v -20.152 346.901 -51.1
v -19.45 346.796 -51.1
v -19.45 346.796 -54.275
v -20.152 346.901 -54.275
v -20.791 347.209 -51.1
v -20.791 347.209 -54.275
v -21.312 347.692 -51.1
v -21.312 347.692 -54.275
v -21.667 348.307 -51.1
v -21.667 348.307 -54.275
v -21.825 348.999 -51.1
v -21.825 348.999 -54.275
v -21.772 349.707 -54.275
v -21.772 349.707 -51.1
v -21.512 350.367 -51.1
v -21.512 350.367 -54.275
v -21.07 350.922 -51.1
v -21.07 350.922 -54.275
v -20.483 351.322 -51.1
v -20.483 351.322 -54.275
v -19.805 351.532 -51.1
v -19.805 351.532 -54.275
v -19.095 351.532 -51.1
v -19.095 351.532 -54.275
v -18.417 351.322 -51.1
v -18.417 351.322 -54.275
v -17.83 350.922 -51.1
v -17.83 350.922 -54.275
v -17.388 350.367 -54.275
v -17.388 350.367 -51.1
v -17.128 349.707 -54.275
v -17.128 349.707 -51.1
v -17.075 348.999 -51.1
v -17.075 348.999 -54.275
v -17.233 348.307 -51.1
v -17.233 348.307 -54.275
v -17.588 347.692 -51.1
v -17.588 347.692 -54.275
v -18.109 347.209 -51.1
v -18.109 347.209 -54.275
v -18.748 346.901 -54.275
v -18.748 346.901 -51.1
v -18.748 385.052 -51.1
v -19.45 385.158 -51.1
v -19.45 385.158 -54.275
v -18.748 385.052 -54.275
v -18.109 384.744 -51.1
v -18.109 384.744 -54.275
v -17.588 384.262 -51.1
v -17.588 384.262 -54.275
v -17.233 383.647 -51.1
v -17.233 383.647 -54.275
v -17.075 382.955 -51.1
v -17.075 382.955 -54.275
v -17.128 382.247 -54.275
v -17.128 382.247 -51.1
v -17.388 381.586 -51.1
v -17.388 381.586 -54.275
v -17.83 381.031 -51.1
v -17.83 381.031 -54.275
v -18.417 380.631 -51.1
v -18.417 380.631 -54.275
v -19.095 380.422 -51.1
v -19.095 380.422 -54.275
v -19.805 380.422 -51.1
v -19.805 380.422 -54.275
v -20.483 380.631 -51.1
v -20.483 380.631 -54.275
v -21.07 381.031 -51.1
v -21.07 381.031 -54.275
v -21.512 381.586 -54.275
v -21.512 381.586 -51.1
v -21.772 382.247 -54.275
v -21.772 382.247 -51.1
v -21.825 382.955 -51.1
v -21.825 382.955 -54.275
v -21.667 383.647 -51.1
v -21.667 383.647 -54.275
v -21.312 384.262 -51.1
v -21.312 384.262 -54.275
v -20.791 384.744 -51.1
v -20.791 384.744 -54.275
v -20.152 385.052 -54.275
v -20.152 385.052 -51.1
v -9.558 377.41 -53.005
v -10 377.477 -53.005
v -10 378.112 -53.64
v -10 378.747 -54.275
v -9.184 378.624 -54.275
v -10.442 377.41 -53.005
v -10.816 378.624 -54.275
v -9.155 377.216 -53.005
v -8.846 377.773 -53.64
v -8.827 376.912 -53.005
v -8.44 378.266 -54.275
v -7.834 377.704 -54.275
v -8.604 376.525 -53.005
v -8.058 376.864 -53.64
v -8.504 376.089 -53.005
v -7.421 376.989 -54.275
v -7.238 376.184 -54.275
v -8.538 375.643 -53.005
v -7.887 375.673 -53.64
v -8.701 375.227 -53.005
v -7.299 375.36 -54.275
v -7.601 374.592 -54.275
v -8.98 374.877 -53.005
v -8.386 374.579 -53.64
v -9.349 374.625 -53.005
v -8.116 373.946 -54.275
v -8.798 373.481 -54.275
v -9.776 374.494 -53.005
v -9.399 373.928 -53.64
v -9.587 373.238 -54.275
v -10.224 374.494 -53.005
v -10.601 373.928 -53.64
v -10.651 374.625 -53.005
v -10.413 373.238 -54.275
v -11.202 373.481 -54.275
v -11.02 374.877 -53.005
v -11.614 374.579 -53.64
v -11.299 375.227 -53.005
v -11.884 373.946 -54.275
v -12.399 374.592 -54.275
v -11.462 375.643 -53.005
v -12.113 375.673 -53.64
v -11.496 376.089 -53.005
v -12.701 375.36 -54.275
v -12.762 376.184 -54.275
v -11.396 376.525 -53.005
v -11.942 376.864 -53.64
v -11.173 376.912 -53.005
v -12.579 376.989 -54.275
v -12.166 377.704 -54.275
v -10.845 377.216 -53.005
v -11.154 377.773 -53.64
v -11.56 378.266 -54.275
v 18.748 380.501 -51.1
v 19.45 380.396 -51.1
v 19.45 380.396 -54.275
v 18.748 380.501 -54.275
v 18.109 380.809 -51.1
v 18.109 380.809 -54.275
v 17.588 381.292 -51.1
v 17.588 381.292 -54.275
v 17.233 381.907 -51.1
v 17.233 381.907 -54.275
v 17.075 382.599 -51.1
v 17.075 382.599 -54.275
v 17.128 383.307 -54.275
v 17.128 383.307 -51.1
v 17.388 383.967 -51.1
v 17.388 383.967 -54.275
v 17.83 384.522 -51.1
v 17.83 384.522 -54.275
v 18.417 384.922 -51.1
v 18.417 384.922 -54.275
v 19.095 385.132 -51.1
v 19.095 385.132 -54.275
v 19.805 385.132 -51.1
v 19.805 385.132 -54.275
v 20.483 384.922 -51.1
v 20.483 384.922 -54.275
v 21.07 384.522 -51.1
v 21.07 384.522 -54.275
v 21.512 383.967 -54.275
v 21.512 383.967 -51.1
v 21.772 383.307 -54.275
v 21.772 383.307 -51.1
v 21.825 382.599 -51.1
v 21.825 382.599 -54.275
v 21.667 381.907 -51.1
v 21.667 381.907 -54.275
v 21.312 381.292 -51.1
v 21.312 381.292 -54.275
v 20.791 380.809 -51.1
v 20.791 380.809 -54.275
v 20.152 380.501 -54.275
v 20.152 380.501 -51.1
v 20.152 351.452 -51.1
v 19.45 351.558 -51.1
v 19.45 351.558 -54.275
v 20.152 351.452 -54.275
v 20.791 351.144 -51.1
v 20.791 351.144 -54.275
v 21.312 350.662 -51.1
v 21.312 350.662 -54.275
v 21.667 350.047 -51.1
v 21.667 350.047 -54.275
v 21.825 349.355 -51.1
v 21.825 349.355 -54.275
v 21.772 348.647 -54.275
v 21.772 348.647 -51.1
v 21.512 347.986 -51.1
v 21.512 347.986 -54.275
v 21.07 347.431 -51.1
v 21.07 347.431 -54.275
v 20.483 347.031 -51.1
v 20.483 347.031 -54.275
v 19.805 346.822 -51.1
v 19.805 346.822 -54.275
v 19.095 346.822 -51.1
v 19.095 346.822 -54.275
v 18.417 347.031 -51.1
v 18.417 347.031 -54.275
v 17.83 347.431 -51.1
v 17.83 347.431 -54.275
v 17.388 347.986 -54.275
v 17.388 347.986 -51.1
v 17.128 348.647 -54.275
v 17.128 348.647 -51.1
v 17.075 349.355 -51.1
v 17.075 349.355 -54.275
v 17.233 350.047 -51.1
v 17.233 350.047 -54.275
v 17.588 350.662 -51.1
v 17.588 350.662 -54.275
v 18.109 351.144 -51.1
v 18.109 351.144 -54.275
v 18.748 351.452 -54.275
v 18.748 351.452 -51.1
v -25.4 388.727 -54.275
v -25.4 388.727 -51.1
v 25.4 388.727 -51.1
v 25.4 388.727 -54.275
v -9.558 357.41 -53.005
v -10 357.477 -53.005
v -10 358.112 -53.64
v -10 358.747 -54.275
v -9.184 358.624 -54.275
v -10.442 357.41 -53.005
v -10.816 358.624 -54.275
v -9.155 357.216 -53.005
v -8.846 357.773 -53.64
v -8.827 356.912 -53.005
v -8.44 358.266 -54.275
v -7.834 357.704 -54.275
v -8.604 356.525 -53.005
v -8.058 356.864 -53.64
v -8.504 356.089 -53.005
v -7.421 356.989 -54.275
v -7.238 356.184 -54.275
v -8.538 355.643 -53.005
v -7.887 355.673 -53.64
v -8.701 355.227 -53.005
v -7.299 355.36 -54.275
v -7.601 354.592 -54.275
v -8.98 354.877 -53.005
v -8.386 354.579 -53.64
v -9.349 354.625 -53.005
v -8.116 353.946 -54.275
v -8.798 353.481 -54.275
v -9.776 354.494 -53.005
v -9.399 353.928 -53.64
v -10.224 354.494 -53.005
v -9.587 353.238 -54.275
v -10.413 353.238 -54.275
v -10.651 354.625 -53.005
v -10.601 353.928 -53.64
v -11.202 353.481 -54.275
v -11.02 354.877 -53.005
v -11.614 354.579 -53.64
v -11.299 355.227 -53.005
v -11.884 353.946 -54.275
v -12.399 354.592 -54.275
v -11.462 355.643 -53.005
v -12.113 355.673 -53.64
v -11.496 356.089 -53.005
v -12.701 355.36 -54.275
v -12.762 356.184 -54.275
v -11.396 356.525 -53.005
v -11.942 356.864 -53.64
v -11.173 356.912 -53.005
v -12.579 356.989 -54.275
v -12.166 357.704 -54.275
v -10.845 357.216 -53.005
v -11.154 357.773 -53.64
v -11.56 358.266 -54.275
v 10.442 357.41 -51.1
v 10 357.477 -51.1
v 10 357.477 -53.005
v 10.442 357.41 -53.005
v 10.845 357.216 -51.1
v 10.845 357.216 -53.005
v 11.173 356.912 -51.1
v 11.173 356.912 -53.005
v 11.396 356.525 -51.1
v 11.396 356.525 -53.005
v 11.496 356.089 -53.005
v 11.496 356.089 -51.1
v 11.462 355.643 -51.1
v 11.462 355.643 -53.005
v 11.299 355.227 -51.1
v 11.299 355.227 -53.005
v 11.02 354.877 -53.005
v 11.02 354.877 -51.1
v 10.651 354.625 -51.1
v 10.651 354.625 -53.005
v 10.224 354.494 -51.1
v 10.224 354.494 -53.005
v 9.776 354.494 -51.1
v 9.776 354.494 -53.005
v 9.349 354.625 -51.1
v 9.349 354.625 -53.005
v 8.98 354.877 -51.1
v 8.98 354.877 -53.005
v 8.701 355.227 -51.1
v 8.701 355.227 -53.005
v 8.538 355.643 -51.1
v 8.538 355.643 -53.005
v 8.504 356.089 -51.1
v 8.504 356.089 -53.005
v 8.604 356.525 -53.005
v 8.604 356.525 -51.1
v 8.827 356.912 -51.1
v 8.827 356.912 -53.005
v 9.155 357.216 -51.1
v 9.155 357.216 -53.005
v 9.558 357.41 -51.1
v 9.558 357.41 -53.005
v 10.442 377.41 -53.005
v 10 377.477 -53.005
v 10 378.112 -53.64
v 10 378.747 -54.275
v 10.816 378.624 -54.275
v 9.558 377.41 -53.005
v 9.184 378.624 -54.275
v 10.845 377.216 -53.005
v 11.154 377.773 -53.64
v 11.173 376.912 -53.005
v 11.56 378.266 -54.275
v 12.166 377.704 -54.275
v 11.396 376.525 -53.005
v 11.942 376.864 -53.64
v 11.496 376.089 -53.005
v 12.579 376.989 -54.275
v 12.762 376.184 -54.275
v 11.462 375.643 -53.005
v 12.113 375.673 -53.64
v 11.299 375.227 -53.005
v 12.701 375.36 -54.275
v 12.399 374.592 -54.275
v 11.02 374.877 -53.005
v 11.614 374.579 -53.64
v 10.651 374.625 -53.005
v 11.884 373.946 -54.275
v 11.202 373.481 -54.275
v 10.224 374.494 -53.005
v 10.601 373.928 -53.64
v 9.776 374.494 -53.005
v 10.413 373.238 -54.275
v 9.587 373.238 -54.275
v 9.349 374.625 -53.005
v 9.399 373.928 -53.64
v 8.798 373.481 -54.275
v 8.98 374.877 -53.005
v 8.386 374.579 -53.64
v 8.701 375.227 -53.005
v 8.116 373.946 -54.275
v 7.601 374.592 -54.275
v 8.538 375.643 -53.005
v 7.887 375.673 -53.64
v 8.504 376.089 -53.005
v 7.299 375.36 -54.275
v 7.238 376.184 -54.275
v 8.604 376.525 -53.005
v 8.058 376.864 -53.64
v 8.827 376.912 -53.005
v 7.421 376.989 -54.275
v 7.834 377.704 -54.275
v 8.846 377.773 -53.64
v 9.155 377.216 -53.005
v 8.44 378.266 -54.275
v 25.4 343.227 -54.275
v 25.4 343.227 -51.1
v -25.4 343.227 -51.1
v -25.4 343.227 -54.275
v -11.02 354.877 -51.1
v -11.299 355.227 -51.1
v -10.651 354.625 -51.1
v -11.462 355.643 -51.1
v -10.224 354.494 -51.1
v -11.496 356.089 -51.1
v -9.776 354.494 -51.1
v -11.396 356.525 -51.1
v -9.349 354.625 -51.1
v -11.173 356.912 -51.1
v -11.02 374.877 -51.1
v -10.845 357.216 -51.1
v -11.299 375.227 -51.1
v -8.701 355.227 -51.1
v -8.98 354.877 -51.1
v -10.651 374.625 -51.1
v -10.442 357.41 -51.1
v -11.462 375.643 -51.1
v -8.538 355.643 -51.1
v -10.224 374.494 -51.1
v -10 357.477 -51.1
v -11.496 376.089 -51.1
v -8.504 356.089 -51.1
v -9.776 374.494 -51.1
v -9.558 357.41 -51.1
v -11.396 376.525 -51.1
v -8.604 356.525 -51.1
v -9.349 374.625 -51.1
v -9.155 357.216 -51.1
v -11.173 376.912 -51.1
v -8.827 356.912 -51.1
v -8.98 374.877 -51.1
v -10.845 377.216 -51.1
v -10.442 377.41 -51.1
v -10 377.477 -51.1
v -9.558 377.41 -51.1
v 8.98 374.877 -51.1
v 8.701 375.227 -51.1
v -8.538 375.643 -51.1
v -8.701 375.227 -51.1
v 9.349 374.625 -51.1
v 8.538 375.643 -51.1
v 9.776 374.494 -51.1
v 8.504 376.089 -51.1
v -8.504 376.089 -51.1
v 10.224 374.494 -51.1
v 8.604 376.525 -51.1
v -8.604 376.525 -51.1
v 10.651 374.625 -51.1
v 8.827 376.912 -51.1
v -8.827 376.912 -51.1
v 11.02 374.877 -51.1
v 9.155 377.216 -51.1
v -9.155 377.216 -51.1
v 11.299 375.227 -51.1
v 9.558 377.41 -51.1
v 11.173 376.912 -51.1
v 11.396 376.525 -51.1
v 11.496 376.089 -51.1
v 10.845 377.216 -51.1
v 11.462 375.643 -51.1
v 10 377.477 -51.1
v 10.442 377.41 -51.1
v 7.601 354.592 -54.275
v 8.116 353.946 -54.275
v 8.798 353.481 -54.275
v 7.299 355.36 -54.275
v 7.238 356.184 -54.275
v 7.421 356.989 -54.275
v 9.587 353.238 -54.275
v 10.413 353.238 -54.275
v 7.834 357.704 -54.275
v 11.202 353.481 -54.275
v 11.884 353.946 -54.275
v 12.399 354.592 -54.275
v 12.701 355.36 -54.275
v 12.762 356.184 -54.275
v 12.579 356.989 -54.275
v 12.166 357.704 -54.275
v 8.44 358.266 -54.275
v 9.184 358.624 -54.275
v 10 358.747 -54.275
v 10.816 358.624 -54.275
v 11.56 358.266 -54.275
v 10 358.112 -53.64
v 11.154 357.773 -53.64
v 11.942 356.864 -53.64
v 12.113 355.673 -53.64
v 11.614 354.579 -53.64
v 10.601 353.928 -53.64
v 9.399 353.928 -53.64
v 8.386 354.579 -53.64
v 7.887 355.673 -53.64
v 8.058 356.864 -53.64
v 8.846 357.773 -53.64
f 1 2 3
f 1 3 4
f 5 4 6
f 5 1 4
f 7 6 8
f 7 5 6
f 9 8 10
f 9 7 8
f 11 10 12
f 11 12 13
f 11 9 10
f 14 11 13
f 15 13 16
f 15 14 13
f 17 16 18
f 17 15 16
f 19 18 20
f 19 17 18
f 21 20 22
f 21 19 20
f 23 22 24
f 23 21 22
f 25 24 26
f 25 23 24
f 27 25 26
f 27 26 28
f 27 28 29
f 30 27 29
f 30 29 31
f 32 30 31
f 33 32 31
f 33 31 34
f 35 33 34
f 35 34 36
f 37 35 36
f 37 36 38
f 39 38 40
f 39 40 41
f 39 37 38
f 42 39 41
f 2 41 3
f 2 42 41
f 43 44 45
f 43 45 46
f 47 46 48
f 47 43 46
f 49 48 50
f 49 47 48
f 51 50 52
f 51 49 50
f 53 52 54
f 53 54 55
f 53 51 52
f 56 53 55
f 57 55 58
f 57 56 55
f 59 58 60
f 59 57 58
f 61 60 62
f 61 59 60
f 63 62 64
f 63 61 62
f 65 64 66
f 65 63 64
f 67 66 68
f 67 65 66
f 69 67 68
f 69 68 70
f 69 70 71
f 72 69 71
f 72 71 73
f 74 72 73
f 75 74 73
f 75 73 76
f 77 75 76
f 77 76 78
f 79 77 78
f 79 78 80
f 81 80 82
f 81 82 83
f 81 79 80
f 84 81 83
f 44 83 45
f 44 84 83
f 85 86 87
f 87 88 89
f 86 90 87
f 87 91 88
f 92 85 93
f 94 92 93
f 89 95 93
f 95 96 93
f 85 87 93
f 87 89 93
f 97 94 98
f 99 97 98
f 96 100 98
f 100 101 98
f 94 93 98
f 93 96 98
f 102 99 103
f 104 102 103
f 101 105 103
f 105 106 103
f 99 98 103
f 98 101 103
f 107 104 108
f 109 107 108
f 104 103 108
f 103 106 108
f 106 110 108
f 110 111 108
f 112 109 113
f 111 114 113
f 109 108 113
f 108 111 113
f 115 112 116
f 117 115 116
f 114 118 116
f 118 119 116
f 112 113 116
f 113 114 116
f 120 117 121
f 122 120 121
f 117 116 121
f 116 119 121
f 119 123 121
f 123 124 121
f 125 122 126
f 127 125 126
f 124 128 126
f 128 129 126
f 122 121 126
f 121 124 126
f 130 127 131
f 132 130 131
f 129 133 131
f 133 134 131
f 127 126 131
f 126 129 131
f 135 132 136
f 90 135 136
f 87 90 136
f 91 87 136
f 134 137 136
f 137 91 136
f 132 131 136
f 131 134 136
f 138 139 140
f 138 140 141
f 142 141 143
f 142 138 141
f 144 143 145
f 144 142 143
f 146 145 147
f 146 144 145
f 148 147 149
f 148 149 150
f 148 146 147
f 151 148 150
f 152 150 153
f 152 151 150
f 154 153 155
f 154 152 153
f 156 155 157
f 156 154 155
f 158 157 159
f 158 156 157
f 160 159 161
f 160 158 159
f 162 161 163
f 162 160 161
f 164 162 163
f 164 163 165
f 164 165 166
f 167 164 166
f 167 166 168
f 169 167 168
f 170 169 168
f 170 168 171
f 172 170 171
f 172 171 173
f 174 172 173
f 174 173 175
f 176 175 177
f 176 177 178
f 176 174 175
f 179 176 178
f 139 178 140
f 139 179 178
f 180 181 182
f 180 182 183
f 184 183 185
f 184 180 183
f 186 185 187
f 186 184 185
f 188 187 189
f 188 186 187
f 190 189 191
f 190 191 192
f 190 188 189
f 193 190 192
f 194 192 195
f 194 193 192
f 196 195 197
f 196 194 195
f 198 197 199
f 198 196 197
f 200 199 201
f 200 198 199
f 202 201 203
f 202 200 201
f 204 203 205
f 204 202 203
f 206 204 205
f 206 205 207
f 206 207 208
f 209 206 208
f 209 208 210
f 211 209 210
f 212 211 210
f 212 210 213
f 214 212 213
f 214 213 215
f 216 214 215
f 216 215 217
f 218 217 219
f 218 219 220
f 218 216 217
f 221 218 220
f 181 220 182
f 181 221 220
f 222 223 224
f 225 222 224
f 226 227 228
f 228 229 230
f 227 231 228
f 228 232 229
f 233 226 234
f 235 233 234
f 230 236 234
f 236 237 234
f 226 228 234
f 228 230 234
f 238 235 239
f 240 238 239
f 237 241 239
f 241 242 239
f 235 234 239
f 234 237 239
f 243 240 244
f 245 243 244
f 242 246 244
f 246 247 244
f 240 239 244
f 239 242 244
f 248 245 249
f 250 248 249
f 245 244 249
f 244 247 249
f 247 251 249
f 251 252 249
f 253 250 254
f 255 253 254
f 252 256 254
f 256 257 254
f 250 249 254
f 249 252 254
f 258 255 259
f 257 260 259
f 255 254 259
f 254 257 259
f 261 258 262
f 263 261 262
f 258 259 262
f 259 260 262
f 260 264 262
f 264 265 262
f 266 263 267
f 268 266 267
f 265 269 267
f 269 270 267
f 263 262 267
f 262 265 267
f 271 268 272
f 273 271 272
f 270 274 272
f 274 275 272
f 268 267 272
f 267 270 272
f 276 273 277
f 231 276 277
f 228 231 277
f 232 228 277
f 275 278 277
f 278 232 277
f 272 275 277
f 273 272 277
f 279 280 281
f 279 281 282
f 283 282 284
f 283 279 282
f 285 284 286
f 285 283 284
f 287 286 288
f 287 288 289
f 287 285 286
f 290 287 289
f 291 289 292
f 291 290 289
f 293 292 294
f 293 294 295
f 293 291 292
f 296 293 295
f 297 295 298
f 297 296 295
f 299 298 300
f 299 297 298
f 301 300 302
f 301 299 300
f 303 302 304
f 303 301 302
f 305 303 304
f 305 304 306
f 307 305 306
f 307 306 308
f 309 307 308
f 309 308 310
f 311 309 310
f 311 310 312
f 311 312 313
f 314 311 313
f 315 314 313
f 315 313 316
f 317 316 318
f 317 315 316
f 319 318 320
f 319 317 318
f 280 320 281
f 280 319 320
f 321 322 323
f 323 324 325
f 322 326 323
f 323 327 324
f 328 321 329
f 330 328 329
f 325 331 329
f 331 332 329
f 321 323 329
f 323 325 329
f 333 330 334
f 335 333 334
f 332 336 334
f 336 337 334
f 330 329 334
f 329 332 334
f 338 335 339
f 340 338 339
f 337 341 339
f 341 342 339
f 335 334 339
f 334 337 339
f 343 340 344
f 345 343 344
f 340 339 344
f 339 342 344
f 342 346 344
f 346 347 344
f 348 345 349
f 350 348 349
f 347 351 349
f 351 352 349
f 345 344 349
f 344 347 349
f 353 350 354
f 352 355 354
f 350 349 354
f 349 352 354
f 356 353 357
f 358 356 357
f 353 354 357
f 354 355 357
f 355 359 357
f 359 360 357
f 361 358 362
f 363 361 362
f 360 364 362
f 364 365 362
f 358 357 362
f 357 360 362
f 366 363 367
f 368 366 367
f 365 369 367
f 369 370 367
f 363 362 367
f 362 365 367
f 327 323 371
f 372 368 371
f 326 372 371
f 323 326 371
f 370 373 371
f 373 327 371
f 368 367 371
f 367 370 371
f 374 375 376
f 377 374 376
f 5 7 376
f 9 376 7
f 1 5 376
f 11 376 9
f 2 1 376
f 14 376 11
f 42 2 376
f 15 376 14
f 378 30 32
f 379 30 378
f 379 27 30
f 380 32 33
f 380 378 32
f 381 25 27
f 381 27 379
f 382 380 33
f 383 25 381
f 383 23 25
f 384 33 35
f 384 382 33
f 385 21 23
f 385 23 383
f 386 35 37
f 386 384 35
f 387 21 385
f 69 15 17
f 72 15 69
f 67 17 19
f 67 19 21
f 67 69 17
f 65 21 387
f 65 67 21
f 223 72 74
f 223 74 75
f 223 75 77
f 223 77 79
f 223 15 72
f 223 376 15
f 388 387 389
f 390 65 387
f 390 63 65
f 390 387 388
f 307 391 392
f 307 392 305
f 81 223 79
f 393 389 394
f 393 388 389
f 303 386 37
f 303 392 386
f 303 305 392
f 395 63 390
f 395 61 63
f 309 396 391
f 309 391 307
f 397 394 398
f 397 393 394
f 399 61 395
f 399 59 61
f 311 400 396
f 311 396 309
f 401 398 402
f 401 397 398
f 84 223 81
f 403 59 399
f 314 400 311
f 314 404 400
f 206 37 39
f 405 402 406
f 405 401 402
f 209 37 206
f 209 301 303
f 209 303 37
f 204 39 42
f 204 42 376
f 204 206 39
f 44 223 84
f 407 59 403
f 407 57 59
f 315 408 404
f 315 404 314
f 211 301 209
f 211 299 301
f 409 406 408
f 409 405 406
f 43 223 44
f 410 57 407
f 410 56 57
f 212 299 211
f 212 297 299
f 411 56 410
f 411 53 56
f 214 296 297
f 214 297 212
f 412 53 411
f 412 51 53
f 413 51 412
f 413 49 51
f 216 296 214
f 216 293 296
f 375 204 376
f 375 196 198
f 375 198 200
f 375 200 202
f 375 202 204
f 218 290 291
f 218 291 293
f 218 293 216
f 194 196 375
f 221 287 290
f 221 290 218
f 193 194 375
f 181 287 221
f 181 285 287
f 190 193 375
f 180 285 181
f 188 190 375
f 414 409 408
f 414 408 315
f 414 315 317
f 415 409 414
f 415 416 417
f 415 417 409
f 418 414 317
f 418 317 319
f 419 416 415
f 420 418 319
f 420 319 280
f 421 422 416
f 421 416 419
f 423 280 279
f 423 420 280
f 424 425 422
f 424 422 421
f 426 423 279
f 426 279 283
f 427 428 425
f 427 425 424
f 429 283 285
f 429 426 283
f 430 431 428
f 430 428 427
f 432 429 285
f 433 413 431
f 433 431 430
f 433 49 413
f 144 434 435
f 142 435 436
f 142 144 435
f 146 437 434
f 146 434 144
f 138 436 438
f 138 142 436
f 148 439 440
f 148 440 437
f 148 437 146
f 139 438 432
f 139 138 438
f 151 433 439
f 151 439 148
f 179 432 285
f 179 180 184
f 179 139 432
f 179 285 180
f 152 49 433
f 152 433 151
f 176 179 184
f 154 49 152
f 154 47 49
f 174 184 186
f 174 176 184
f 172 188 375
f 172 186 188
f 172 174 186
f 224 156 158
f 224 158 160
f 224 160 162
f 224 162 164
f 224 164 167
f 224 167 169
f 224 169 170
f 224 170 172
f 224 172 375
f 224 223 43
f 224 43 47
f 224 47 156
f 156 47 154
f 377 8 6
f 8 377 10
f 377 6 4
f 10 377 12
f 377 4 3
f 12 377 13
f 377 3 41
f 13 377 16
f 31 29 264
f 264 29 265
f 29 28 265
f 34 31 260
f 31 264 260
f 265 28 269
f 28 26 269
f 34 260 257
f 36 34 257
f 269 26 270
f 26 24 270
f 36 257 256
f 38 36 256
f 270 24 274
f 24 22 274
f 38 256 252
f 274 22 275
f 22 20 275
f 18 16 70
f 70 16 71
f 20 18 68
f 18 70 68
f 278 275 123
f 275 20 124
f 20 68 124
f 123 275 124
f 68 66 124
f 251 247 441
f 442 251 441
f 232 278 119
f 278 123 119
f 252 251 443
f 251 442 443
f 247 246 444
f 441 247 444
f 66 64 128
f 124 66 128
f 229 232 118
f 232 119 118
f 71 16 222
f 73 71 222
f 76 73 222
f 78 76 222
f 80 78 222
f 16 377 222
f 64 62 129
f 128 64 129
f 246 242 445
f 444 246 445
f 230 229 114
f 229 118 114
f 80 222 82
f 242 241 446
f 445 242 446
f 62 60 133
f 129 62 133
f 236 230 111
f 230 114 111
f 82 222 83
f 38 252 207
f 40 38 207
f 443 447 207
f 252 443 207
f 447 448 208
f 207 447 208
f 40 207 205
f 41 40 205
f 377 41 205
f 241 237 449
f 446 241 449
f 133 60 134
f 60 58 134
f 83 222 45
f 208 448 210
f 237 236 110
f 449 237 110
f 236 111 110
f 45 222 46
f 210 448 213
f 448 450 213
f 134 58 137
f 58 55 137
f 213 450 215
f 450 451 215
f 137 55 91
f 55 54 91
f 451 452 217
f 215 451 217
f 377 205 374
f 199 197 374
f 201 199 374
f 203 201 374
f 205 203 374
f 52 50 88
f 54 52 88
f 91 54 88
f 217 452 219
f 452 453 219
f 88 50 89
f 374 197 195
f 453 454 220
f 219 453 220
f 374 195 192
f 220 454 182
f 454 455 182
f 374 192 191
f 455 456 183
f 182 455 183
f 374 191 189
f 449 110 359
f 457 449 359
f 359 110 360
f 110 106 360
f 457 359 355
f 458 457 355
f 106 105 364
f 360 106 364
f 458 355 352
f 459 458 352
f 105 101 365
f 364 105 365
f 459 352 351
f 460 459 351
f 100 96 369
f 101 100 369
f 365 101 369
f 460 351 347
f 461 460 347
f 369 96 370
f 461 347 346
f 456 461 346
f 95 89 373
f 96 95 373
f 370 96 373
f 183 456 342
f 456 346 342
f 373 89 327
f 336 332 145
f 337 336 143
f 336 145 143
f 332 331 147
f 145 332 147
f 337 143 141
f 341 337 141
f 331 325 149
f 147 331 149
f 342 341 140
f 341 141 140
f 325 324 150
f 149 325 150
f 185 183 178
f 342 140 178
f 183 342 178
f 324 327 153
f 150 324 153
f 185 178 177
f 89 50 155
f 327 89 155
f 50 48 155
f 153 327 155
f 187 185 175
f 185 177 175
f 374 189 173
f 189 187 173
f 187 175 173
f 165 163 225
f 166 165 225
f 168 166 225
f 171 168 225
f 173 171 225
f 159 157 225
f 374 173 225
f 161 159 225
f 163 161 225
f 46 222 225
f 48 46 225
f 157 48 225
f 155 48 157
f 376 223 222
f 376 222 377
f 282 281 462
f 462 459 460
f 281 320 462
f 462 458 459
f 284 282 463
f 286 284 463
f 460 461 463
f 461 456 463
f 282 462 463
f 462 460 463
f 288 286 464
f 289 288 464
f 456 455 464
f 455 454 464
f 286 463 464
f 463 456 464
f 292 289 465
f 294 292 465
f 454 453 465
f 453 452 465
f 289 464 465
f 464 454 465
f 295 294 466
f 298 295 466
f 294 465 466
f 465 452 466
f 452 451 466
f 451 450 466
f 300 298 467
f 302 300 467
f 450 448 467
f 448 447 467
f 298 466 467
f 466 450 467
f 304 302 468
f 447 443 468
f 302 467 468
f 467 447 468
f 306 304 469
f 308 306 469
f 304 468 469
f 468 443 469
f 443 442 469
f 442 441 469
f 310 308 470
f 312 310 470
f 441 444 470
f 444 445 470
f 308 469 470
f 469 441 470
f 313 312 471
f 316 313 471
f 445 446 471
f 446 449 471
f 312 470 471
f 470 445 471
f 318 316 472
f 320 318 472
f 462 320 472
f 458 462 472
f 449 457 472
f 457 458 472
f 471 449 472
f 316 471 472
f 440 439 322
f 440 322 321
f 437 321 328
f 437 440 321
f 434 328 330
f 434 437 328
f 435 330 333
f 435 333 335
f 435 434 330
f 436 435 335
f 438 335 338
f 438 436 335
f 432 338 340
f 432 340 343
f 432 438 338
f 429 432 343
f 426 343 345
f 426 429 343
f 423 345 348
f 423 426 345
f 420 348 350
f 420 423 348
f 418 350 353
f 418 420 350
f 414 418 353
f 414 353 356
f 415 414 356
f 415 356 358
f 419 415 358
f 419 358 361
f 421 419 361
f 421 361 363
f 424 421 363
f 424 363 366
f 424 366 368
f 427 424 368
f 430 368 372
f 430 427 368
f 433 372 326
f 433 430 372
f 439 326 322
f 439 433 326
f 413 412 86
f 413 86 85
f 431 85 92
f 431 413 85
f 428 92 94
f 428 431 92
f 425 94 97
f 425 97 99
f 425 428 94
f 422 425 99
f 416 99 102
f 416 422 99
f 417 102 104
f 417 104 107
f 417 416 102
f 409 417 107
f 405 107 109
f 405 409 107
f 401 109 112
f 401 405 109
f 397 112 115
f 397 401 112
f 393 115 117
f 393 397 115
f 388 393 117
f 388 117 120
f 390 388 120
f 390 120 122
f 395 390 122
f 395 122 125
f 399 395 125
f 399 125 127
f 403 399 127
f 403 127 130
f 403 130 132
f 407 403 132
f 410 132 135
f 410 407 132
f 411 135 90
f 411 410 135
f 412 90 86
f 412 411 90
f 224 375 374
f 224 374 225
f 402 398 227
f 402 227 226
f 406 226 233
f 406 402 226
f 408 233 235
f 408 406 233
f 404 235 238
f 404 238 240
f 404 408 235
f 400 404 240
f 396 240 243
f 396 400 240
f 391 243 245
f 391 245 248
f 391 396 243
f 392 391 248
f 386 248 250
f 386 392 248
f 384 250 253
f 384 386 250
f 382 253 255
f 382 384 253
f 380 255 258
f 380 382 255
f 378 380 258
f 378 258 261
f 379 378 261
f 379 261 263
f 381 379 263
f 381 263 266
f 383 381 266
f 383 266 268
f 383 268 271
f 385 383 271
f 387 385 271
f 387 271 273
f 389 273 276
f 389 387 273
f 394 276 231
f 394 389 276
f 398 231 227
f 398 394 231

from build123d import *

# Parameters (mm, degrees)
SKETCH2_R           = 1.5
SKETCH2_R_2         = 2.38125
BOSS_EXTRUDE1_DEPTH = 3.175
CHAMFER1_SIZE       = 1.27


with BuildPart() as part:
    # Sketch2 → Boss-Extrude1 (new body)
    with BuildSketch(Plane(origin=(0, 0, -51.1), x_dir=(-1, 0, 0), z_dir=(0, 0, -1))):
        Polygon((13.5, 388.72686963), (25.4, 388.72686963), (25.4, 343.22686963), (13.5, 343.22686963), (-13.5, 343.22686963), (-25.4, 343.22686963), (-25.4, 388.72686963), (-13.5, 388.72686963), align=None)
        with Locations(Location((10, 355.97686963, 0), (0, 0, 90))):
            Circle(SKETCH2_R, mode=Mode.SUBTRACT)
        with Locations(Location((10, 375.97686963, 0), (0, 0, 90))):
            Circle(SKETCH2_R, mode=Mode.SUBTRACT)
        with Locations(Location((-10, 375.97686963, 0), (0, 0, 90))):
            Circle(SKETCH2_R, mode=Mode.SUBTRACT)
        with Locations(Location((-10, 355.97686963, 0), (0, 0, 90))):
            Circle(SKETCH2_R, mode=Mode.SUBTRACT)
        with Locations(Location((19.45, 382.77686963, 0), (0, 0, 90))):
            Circle(SKETCH2_R_2, mode=Mode.SUBTRACT)
        with Locations(Location((-19.45, 382.77686963, 0), (0, 0, 270))):
            Circle(SKETCH2_R_2, mode=Mode.SUBTRACT)
        with Locations(Location((19.45, 349.17686963, 0), (0, 0, 270))):
            Circle(SKETCH2_R_2, mode=Mode.SUBTRACT)
        with Locations(Location((-19.45, 349.17686963, 0), (0, 0, 90))):
            Circle(SKETCH2_R_2, mode=Mode.SUBTRACT)
    extrude(amount=BOSS_EXTRUDE1_DEPTH)

    # Chamfer1
    chamfer1_edges = [part.edges().sort_by_distance(p)[0] for p in [
        (-10, 354.47686963, -54.275),
        (-10, 374.47686963, -54.275),
        (10, 374.47686963, -54.275),
        (10, 354.47686963, -54.275),
    ]]
    chamfer(chamfer1_edges, length=CHAMFER1_SIZE)


solid = part.part
